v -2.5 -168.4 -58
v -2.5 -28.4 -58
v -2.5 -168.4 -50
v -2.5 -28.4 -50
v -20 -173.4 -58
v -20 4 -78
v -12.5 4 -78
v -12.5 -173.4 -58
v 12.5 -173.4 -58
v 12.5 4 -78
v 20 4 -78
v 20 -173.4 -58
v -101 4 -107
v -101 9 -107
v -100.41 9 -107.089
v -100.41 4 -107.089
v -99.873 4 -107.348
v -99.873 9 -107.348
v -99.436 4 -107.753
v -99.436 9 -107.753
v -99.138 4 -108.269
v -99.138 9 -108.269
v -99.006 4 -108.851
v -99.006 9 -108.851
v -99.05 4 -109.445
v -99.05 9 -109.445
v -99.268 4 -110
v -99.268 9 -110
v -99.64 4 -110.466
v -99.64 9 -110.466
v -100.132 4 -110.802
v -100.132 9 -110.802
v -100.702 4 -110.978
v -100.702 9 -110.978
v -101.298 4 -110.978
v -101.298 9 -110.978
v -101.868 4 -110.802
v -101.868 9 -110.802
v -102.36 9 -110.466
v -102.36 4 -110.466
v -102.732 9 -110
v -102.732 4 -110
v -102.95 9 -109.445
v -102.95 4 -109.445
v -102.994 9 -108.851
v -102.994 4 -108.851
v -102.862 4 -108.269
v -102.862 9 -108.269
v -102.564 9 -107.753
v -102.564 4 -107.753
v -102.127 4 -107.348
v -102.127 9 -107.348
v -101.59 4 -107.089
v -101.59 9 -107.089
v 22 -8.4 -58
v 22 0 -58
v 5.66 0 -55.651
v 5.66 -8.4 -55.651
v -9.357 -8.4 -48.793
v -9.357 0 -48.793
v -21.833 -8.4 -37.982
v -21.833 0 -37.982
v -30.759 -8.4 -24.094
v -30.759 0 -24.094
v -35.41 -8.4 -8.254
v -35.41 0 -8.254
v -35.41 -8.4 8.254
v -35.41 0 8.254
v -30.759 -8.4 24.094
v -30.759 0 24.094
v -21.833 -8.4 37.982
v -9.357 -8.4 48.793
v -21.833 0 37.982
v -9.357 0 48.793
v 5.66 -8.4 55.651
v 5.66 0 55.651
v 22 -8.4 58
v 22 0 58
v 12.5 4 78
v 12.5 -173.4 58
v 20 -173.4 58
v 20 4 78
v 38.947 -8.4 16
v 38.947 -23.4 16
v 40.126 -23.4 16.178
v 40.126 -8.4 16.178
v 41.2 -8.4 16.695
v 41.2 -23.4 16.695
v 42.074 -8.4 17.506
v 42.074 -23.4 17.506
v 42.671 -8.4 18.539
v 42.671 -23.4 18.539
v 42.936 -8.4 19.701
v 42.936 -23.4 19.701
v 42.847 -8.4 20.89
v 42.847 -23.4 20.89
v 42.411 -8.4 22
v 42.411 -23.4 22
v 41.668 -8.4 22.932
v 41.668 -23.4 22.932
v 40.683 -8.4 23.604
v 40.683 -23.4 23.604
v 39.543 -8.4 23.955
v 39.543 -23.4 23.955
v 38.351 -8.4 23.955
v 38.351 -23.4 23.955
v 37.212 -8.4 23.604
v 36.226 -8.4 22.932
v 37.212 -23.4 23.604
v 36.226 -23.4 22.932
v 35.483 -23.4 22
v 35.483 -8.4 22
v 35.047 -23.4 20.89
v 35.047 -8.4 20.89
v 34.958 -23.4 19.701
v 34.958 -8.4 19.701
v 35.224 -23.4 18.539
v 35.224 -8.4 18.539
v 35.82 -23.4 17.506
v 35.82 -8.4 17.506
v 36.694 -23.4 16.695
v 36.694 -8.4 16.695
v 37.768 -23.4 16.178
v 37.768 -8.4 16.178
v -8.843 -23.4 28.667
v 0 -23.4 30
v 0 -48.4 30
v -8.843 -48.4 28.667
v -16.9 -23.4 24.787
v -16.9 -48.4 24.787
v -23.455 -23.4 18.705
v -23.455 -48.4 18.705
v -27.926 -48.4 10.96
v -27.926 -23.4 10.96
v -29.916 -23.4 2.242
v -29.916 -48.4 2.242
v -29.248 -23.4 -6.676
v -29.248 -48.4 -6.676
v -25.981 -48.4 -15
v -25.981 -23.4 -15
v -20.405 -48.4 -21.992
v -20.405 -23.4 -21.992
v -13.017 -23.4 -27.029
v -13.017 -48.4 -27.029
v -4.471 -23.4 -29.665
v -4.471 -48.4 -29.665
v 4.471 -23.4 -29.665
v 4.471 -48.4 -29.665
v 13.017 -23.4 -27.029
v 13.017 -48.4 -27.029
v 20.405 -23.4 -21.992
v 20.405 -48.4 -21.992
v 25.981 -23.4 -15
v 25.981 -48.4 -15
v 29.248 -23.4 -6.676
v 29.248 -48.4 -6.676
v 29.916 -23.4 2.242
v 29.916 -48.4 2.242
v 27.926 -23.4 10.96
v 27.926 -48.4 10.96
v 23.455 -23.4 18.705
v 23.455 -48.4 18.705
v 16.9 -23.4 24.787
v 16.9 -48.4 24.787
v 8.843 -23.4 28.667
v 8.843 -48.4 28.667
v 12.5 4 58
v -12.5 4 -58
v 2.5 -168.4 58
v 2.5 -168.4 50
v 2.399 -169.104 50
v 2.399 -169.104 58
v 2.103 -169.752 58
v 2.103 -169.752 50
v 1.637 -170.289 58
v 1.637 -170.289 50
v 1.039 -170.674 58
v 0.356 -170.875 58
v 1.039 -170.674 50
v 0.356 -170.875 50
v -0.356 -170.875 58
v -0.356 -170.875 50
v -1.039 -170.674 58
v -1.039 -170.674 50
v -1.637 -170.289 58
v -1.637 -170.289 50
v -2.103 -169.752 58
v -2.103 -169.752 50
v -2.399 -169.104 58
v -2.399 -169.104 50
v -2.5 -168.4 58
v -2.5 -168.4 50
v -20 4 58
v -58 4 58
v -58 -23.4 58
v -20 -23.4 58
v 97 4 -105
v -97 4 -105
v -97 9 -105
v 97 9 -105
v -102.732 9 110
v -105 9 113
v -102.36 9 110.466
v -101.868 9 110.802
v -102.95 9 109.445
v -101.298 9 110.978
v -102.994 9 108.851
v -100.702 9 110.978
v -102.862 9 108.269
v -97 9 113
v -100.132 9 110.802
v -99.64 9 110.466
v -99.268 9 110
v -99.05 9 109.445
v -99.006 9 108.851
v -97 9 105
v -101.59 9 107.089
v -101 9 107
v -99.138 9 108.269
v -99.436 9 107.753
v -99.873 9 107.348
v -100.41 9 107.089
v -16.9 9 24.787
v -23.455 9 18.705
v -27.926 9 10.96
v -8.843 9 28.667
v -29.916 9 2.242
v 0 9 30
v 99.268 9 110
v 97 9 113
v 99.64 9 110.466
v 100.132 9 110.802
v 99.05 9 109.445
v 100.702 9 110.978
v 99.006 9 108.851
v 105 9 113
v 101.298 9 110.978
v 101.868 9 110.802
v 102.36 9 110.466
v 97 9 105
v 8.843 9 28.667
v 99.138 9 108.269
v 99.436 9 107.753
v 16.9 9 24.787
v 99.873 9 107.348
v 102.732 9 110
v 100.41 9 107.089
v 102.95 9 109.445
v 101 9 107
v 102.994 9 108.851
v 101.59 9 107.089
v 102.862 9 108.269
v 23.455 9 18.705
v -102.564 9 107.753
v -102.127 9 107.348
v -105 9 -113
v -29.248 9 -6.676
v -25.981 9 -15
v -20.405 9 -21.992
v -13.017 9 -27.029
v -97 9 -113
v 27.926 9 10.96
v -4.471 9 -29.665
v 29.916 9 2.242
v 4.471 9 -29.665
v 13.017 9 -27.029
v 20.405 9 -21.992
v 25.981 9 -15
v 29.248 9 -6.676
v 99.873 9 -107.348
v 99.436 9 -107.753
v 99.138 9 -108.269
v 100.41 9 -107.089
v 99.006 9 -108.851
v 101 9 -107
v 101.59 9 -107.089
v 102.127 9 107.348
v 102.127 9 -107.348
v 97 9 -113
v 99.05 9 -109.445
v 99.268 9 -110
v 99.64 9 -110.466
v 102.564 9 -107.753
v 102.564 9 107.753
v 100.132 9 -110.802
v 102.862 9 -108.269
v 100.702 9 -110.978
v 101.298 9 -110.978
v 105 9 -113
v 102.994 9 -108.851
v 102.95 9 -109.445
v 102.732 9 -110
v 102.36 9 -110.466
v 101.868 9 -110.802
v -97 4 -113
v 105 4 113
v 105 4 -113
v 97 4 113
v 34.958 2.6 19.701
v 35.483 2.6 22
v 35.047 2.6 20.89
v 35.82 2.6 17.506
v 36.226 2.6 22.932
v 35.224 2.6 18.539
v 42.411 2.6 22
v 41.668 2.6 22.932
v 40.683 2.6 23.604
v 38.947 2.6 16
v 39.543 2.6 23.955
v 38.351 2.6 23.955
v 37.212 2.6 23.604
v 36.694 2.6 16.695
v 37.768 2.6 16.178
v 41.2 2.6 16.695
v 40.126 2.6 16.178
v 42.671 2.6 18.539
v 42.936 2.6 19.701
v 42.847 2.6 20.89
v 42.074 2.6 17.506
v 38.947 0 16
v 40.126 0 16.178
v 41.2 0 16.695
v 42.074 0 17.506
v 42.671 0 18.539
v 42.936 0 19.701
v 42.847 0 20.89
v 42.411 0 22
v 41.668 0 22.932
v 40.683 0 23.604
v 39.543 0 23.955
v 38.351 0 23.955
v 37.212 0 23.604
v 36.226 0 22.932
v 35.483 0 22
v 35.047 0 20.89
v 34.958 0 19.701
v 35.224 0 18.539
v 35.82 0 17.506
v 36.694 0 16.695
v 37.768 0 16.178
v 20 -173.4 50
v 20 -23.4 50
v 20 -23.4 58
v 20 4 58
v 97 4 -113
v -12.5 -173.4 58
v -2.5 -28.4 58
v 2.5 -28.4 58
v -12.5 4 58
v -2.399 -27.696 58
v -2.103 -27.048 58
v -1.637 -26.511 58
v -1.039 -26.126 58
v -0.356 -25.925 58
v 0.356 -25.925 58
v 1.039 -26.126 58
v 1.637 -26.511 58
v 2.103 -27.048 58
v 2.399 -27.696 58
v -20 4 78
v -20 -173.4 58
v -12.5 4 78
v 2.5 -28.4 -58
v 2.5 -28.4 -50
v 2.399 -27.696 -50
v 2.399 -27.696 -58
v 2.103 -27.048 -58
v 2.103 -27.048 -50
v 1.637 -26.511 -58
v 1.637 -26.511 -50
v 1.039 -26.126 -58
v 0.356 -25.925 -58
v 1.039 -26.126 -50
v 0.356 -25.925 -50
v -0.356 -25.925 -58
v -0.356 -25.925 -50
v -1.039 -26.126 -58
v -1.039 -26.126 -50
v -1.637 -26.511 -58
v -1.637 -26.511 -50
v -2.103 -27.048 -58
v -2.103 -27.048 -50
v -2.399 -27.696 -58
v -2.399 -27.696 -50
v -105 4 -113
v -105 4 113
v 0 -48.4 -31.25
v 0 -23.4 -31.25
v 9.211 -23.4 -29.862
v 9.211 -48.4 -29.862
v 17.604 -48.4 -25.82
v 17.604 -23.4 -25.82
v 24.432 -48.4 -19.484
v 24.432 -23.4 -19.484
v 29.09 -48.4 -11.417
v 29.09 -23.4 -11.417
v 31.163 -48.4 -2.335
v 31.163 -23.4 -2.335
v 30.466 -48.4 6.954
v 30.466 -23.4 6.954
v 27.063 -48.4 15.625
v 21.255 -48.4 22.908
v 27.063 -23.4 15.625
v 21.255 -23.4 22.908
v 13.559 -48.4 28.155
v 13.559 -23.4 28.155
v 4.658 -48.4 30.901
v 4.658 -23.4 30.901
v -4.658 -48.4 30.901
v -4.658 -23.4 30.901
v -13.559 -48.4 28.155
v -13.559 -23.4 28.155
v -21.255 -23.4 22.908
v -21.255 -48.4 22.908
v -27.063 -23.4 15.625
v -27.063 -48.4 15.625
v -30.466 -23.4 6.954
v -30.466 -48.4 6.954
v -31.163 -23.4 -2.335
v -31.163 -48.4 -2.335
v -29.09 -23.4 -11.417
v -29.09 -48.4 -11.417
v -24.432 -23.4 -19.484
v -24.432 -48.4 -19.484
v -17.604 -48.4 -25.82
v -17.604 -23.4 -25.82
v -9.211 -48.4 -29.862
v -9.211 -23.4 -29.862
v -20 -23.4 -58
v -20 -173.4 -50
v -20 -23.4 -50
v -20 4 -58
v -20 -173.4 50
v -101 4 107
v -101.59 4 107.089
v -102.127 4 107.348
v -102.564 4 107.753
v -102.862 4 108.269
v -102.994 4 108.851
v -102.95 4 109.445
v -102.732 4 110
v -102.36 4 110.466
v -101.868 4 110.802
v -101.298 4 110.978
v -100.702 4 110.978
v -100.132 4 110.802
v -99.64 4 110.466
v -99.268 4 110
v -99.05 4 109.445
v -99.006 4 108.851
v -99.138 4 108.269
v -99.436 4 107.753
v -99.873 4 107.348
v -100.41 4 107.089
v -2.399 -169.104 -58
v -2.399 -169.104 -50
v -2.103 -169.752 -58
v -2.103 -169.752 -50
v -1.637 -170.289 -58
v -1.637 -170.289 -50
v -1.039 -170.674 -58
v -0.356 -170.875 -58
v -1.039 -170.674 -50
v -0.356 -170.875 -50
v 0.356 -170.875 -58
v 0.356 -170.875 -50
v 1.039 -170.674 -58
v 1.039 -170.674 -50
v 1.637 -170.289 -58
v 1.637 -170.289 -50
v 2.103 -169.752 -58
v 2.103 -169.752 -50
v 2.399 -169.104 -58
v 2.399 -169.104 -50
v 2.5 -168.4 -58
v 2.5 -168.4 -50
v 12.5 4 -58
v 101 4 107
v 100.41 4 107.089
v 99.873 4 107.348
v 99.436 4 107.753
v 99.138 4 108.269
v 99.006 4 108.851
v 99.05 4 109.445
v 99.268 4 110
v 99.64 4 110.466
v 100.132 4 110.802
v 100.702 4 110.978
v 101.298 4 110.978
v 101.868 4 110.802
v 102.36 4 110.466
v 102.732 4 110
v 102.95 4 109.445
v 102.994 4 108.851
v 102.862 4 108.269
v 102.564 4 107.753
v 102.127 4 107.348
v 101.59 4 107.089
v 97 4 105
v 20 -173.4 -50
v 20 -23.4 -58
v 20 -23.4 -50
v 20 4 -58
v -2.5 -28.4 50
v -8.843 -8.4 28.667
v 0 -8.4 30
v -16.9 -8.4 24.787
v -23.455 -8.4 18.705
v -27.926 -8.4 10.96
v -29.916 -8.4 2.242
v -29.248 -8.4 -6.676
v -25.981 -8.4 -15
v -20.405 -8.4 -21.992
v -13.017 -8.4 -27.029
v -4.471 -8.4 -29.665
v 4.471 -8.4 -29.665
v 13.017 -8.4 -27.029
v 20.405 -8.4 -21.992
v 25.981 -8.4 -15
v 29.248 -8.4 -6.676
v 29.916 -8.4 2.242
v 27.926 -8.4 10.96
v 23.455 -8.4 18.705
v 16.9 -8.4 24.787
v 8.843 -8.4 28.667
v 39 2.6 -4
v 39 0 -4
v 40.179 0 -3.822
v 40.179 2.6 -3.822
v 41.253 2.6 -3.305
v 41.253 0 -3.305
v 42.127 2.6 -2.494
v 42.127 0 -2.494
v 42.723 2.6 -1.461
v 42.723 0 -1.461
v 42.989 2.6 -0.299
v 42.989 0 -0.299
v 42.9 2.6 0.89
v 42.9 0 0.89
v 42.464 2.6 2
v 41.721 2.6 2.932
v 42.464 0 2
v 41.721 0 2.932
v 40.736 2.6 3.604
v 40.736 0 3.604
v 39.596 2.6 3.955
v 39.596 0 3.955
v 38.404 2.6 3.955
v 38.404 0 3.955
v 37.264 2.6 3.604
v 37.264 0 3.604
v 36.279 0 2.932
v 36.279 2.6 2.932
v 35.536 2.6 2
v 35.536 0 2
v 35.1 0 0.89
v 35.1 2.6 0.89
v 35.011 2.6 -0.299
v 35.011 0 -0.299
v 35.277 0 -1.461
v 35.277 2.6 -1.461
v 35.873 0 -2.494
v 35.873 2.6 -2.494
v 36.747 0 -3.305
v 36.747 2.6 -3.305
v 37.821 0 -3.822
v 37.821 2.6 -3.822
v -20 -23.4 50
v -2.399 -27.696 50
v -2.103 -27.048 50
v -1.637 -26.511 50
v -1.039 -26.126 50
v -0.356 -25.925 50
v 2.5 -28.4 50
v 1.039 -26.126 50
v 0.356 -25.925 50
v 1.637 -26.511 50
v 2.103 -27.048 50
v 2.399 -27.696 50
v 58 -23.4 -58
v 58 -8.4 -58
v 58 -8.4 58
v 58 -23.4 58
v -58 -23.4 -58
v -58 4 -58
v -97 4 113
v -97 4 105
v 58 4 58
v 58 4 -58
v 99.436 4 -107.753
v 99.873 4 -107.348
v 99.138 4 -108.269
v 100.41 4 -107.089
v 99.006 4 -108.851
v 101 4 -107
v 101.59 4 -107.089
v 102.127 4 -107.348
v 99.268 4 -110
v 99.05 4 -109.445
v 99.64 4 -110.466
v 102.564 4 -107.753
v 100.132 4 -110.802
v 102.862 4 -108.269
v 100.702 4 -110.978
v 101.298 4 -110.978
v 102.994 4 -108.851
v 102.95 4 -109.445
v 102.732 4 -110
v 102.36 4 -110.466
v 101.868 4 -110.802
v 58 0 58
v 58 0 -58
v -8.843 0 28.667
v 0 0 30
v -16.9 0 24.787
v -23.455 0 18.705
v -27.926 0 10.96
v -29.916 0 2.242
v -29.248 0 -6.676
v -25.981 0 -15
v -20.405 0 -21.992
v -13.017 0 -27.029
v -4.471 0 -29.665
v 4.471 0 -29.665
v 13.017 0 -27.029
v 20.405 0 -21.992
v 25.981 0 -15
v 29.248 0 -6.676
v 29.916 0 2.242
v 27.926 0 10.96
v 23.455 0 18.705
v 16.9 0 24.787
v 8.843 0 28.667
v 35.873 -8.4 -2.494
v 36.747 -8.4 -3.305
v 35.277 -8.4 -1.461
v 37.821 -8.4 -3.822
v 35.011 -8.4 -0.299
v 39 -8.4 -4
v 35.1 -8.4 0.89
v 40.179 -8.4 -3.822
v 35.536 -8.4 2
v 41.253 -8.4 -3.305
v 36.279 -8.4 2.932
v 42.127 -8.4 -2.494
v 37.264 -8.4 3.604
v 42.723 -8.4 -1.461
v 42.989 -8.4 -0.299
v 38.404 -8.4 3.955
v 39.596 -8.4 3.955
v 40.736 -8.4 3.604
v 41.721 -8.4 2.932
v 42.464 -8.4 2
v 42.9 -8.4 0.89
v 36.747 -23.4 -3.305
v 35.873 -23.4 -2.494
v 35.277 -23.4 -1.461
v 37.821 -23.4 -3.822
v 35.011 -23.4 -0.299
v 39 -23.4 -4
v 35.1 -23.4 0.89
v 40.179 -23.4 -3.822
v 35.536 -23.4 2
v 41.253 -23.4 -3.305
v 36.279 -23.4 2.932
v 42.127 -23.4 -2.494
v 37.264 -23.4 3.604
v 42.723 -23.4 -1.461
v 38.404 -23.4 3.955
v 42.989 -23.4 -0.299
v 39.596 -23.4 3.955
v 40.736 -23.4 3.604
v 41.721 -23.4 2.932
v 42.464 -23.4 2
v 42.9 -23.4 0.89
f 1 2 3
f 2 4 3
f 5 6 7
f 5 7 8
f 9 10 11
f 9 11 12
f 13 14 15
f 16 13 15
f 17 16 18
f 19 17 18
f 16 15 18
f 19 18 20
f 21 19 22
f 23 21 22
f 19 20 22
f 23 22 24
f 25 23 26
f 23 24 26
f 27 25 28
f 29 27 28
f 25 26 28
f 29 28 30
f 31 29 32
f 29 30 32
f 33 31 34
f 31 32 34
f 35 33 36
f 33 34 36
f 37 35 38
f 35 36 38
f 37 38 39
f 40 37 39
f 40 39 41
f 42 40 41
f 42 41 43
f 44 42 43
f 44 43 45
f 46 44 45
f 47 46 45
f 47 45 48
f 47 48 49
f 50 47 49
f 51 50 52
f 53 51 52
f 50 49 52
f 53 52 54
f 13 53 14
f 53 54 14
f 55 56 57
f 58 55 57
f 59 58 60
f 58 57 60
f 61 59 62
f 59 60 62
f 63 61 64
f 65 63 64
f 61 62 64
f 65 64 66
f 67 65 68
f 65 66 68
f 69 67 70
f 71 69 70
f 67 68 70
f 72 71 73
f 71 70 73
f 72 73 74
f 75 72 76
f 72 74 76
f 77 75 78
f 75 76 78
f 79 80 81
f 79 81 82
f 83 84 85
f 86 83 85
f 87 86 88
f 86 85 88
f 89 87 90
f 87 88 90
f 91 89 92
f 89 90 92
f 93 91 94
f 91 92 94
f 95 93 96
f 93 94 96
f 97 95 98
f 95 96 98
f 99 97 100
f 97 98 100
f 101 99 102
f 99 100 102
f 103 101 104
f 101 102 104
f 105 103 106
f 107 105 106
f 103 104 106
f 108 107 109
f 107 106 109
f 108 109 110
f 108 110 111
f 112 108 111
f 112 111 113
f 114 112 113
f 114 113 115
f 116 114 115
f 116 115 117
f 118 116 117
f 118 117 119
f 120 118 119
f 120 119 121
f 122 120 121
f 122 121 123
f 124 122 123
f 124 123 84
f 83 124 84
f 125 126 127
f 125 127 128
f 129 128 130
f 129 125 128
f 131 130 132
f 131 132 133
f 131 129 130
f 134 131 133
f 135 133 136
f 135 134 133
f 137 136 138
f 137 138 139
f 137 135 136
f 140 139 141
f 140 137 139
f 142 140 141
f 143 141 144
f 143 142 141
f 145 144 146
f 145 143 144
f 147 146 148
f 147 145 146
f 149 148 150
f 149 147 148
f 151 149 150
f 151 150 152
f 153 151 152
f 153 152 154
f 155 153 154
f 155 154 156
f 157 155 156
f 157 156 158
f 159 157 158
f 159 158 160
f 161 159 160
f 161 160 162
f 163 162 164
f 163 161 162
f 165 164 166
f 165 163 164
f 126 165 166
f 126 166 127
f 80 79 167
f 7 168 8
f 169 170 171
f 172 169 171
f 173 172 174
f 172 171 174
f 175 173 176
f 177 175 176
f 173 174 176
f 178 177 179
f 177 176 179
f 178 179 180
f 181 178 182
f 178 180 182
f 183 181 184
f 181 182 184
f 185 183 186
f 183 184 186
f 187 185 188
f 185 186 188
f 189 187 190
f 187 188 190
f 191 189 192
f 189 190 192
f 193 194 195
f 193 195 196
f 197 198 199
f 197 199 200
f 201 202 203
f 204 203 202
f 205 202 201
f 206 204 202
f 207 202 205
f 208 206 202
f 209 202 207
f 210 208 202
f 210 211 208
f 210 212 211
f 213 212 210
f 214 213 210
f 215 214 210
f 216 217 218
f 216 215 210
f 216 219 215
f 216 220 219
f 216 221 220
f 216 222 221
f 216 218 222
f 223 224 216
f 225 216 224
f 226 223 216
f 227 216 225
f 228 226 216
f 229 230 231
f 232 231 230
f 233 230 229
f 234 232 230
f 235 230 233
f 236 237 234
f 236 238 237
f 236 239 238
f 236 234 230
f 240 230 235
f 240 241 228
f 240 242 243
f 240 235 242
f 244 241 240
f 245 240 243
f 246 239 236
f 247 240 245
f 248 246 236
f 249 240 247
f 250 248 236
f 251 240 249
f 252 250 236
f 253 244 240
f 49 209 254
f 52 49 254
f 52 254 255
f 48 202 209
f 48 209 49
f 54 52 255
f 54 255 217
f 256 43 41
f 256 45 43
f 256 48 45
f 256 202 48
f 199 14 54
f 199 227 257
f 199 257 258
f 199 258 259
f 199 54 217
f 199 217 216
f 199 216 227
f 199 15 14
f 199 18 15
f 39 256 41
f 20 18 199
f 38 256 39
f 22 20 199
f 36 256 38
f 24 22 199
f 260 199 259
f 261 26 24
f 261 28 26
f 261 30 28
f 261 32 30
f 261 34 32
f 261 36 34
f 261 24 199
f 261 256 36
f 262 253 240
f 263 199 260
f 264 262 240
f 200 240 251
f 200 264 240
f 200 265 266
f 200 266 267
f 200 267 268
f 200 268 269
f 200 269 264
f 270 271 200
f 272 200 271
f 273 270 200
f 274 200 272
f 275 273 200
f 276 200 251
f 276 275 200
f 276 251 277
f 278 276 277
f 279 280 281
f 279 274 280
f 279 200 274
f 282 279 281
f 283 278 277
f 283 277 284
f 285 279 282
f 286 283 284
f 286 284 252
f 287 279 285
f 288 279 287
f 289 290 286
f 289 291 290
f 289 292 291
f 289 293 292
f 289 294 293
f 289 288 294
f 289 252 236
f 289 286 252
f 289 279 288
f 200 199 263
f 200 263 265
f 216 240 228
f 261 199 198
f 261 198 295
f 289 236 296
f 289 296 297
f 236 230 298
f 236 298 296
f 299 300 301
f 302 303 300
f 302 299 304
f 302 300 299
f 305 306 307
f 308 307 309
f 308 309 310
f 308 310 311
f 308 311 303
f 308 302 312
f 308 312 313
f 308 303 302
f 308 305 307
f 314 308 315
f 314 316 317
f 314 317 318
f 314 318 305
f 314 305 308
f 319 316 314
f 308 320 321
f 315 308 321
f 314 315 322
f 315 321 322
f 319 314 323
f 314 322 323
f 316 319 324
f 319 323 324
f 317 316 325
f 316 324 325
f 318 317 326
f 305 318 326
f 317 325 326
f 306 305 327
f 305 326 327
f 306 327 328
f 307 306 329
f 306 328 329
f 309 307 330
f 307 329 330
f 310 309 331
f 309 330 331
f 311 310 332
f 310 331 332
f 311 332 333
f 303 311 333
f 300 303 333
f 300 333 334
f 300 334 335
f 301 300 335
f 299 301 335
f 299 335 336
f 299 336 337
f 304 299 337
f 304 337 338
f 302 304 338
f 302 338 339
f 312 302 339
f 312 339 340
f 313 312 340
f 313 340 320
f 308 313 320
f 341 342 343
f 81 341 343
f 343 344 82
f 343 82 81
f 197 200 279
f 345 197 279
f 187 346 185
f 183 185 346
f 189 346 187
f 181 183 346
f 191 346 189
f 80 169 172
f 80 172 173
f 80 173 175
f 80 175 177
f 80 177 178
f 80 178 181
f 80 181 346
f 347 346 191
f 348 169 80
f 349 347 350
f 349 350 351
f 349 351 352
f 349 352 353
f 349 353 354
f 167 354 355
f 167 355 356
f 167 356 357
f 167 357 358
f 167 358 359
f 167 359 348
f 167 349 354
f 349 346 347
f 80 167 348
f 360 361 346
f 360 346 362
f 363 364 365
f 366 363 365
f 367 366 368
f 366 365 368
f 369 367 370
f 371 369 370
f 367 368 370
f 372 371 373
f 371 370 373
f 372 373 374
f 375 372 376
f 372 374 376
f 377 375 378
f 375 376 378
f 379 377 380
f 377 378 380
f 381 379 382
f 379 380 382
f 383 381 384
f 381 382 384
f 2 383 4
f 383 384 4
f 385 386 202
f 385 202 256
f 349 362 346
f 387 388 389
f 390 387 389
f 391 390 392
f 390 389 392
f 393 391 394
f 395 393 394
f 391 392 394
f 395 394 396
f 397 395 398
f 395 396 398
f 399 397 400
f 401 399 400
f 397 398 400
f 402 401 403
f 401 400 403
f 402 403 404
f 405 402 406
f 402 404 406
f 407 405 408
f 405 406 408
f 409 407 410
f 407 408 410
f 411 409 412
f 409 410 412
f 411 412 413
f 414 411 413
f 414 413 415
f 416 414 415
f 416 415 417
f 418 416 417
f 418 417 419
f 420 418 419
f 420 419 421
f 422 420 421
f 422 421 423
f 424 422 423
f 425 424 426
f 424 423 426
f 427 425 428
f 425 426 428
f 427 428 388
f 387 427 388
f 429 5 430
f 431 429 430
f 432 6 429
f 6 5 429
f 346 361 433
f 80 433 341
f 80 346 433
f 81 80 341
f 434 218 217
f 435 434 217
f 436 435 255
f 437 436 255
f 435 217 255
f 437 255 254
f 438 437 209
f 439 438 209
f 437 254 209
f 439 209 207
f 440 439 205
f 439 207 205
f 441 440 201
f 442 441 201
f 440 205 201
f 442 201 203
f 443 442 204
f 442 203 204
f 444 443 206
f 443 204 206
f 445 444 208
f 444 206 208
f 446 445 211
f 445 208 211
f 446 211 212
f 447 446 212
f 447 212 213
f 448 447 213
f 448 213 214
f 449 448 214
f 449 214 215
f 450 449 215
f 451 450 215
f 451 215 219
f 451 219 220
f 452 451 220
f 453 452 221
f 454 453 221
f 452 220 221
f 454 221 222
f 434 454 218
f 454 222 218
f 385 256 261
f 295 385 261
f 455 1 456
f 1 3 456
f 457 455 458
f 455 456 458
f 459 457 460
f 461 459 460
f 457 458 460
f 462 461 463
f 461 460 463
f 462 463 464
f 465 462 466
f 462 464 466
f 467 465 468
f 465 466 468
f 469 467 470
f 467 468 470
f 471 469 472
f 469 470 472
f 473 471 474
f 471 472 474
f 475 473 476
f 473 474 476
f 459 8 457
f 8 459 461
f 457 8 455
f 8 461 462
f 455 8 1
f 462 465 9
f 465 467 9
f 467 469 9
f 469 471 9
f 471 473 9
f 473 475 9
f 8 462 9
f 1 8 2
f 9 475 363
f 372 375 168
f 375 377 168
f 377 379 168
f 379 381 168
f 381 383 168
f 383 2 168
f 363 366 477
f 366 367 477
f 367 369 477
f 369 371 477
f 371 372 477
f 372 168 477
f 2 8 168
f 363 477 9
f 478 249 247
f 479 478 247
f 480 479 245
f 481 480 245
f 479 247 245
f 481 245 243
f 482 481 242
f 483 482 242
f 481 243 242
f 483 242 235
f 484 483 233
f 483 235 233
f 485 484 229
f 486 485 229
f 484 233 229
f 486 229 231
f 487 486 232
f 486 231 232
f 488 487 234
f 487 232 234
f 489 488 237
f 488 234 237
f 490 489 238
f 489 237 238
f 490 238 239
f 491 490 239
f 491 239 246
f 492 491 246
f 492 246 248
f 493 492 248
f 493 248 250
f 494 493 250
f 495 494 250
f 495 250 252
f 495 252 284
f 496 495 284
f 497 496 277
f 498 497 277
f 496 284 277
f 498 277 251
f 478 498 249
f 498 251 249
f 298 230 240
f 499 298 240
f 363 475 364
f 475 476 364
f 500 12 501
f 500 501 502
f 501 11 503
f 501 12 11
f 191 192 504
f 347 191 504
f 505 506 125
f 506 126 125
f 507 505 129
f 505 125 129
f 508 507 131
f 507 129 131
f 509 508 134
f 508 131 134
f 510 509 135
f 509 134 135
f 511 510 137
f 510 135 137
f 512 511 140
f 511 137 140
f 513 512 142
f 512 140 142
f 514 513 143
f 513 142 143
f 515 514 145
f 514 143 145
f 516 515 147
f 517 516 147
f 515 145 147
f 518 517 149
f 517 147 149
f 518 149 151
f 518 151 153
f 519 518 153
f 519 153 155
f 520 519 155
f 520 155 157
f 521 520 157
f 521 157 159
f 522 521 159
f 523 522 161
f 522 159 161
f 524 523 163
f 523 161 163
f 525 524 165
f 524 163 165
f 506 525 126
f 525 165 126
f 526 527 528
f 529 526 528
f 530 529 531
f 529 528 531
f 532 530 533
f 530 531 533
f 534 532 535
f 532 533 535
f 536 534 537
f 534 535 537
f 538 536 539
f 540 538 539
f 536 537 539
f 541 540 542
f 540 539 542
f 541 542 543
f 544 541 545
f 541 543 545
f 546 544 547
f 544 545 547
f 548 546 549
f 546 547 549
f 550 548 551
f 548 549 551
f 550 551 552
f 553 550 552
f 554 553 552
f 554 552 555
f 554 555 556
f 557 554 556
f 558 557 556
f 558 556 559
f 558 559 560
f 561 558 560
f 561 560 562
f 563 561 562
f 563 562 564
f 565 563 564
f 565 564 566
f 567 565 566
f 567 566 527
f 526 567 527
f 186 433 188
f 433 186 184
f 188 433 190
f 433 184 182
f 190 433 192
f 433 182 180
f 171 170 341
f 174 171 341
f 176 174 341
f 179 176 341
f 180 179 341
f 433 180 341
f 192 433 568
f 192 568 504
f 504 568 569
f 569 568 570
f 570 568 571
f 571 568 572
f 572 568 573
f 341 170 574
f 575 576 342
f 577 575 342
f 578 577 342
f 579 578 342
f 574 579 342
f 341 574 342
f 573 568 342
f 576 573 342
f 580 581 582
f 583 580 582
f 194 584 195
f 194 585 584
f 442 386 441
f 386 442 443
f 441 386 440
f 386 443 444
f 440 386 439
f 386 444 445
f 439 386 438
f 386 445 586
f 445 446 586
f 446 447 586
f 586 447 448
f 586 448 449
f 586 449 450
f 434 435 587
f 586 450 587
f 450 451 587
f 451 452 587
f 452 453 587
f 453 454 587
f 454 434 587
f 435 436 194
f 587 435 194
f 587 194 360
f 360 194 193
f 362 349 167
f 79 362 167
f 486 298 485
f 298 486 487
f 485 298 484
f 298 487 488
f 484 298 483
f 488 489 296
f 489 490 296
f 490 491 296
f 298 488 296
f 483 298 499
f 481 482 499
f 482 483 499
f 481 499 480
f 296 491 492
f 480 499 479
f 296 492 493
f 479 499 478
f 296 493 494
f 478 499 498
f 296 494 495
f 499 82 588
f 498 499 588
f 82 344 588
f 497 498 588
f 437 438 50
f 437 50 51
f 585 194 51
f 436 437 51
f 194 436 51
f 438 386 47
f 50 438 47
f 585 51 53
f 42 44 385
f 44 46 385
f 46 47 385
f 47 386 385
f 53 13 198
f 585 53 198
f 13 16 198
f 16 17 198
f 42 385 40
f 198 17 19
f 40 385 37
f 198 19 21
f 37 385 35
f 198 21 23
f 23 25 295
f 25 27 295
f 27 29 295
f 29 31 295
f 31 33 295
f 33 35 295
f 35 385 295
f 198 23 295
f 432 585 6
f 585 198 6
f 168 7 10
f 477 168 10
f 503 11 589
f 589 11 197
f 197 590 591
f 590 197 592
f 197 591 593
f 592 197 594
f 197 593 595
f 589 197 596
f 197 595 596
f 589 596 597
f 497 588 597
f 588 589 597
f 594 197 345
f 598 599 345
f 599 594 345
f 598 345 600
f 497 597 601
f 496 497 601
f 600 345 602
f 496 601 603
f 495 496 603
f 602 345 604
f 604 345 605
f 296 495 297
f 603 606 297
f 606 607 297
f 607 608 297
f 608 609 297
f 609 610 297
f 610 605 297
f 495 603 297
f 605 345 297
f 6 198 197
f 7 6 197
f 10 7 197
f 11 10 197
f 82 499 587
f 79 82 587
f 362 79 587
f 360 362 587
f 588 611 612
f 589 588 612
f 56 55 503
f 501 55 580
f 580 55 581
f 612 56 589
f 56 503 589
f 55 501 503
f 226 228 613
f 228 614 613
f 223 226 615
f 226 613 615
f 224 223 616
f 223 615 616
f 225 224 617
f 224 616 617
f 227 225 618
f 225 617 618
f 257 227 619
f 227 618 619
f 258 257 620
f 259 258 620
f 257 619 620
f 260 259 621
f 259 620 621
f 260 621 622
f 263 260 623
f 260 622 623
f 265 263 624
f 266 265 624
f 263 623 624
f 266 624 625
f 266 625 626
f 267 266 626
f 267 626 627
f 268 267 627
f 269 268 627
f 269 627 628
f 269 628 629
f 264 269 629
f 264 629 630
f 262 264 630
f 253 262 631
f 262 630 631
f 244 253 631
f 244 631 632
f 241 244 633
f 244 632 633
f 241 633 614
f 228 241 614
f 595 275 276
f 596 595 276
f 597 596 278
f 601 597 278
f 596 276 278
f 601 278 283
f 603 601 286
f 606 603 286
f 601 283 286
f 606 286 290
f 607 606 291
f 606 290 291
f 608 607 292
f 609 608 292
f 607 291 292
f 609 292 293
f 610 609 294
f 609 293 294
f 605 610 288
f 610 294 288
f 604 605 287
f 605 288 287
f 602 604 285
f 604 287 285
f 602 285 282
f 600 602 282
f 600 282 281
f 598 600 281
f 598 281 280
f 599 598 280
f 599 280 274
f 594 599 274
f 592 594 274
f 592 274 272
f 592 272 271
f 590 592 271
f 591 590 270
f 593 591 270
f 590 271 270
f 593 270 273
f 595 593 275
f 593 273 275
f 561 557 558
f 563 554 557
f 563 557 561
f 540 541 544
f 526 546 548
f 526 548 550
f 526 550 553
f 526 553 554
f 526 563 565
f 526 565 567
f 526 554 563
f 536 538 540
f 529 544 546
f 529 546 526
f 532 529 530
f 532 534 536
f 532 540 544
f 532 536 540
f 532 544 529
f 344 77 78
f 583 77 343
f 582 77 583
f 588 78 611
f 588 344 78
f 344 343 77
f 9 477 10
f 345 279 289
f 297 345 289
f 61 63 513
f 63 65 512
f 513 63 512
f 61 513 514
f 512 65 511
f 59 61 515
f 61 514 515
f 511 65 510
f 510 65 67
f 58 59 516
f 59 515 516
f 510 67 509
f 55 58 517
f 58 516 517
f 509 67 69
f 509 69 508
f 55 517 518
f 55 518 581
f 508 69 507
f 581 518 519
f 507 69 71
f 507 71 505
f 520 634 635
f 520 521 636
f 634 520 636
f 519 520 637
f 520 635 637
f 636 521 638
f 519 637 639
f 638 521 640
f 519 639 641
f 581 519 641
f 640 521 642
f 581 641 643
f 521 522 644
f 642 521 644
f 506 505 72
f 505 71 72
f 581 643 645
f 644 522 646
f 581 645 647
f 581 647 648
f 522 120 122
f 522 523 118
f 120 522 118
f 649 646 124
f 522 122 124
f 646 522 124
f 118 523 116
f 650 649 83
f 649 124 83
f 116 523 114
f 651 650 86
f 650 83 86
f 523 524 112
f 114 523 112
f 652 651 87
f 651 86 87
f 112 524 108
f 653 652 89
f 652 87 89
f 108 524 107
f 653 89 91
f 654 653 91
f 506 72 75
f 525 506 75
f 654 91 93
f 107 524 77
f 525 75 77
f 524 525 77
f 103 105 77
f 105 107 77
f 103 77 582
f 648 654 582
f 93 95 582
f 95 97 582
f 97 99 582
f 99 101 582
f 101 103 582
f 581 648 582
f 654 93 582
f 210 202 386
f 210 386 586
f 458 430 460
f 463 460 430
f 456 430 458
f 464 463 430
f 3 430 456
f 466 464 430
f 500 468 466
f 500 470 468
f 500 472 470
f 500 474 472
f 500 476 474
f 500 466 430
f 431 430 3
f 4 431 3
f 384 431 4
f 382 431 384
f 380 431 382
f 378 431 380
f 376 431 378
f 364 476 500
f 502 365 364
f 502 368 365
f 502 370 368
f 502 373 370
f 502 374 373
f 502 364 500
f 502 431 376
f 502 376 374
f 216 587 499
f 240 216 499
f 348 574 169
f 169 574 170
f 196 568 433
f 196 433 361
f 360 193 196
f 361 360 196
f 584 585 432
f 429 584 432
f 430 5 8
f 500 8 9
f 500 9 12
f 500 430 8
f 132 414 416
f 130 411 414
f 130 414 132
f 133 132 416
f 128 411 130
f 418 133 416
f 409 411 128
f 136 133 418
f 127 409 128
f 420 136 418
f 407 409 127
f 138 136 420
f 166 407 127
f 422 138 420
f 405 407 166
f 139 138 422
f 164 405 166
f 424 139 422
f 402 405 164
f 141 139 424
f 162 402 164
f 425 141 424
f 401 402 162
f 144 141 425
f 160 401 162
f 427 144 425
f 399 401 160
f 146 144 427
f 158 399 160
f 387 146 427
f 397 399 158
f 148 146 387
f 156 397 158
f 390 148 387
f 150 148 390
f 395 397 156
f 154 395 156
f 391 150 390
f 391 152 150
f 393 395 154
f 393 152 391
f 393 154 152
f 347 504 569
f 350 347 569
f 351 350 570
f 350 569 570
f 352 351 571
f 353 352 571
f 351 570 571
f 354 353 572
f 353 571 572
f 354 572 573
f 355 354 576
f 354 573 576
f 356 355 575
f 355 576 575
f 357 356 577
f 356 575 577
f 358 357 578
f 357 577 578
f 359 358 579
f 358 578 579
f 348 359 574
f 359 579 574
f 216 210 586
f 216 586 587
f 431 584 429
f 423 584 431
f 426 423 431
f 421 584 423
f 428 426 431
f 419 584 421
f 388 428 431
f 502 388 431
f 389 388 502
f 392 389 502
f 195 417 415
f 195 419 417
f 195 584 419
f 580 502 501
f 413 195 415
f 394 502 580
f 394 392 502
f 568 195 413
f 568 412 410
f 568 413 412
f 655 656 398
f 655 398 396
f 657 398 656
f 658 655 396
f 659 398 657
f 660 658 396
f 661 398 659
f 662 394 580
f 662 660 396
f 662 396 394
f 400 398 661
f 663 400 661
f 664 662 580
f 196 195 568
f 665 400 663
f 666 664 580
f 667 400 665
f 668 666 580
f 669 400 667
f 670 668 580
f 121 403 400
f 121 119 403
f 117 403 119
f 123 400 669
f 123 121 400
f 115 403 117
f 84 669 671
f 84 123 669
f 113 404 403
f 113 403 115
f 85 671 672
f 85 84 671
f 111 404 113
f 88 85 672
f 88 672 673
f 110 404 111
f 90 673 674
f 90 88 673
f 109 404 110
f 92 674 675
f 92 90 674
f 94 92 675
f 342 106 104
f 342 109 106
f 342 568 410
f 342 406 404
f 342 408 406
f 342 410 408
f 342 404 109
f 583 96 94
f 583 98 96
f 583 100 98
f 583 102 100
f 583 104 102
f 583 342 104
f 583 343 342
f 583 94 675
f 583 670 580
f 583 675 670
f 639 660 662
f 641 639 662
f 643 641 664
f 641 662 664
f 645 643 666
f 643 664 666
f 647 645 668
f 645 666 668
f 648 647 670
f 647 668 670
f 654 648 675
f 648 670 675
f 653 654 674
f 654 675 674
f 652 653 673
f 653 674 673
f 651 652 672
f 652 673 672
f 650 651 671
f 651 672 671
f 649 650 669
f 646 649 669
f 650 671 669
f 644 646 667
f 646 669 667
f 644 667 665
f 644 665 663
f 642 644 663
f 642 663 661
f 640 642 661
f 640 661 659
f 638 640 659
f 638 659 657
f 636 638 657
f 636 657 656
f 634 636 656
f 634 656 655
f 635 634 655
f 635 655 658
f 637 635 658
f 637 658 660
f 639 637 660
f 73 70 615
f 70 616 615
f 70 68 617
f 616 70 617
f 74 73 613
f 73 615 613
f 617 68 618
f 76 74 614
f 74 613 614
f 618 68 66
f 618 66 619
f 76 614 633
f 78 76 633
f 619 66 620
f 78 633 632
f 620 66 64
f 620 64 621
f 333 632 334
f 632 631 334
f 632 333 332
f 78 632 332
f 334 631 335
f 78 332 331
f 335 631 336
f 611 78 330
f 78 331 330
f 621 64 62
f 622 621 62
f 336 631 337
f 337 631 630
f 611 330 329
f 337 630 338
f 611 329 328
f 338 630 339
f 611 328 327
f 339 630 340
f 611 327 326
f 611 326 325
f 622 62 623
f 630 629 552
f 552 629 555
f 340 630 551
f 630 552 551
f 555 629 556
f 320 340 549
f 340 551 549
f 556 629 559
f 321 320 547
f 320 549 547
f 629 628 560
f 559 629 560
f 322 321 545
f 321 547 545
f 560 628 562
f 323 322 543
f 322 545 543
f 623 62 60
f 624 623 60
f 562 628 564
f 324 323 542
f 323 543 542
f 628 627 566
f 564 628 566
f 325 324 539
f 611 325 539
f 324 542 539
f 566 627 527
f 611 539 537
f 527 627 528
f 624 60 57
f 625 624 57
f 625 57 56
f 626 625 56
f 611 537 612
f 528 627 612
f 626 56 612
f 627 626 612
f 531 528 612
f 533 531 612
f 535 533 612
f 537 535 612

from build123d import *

# Parameters (mm, degrees)
SKETCH4_W                      = 116
SKETCH4_H                      = 116
BOSS_EXTRUDE1_DEPTH            = 4
SKETCH6_R                      = 30
CUT_EXTRUDE1_DEPTH             = 83.121860671
BOSS_EXTRUDE3_DEPTH            = 8.4
SKETCH10_W                     = 116
SKETCH10_H                     = 116
BOSS_EXTRUDE5_DEPTH            = 15
SKETCH11_R                     = 4
POSITIONING_HOLE_DEPTH         = 26
SKETCH23_R                     = 4
SNAPPING_HOLE_DEPTH            = 26
SKETCH13_R                     = 31.25
SKETCH13_R_2                   = 30
BOSS_EXTRUDE6_DEPTH            = 25
SKETCH24_W                     = 40
SKETCH24_H                     = 8
BOSS_EXTRUDE7_DEPTH            = 150
BOSS_EXTRUDE9_DEPTH            = 40
CUT_EXTRUDE6_DEPTH             = 8
CUT_EXTRUDE6_DIRECTION_2_REACH = 229.876
CUT_EXTRUDE7_REACH             = 225.194
CUT_EXTRUDE9_REACH             = 204.284
SKETCH37_W                     = 25
SKETCH37_H                     = 20
SKETCH41_W                     = 210
SKETCH41_H                     = 210
BOSS_EXTRUDE11_DEPTH           = 5
SKETCH12_R                     = 30
MAIN_HOLE_DEPTH                = 212.068709192
SKETCH43_W                     = 8
SKETCH43_H                     = 8
SKETCH43_R                     = 2
BOSS_EXTRUDE12_DEPTH           = 5


with BuildPart() as part:
    # Sketch4 → Boss-Extrude1 (new body)
    with BuildSketch(Plane(origin=(0, 0, 0), x_dir=(1, 0, 0), z_dir=(0, 1, 0))):
        Rectangle(SKETCH4_W, SKETCH4_H)
    extrude(amount=BOSS_EXTRUDE1_DEPTH)

    # Sketch6 → Cut-Extrude1 (cut, through all)
    with BuildSketch(Plane(origin=(0, 4, 0), x_dir=(1, 0, 0), z_dir=(0, 1, 0))):
        with Locations(Location((0, 0, 0), (0, 0, 270))):
            Circle(SKETCH6_R)
    extrude(amount=-CUT_EXTRUDE1_DEPTH, mode=Mode.SUBTRACT)

    # Sketch8 → Boss-Extrude3 (add)
    with BuildSketch(Plane.XZ):
        with BuildLine():
            Line((-58, 58), (-58, -58))
            Line((-58, -58), (22, -58))
            ThreePointArc((22, -58), (-36, 0), (22, 58))
            Line((22, 58), (-58, 58))
        make_face()
    extrude(amount=BOSS_EXTRUDE3_DEPTH)

    # Sketch10 → Boss-Extrude5 (add)
    with BuildSketch(Plane.XZ.offset(8.4)):
        Rectangle(SKETCH10_W, SKETCH10_H)
    extrude(amount=BOSS_EXTRUDE5_DEPTH)

    # Sketch11 → positioning hole (cut)
    with BuildSketch(Plane.XZ.offset(23.4)):
        with Locations(Location((39, 0, 0), (0, 0, 270))):
            Circle(SKETCH11_R)
    extrude(amount=-POSITIONING_HOLE_DEPTH, mode=Mode.SUBTRACT)

    # Sketch23 → snapping hole (cut)
    with BuildSketch(Plane.XZ.offset(23.4)):
        with Locations(Location((38.947036647, 20, 0), (0, 0, 270))):
            Circle(SKETCH23_R)
    extrude(amount=-SNAPPING_HOLE_DEPTH, mode=Mode.SUBTRACT)

    # Sketch13 → Boss-Extrude6 (add)
    with BuildSketch(Plane.XZ.offset(23.4)):
        with Locations(Location((0, 0, 0), (0, 0, 270))):
            Circle(SKETCH13_R)
        with Locations(Location((0, 0, 0), (0, 0, 90))):
            Circle(SKETCH13_R_2, mode=Mode.SUBTRACT)
    extrude(amount=BOSS_EXTRUDE6_DEPTH)

    # Sketch24 → Boss-Extrude7 (add)
    with BuildSketch(Plane.XZ.offset(23.4)):
        with Locations((0, 54)):
            Rectangle(SKETCH24_W, SKETCH24_H)
        with Locations((0, -54)):
            Rectangle(SKETCH24_W, SKETCH24_H)
    extrude(amount=BOSS_EXTRUDE7_DEPTH)

    # Sketch28 → Boss-Extrude9 (add)
    with BuildSketch(Plane.ZY.offset(20)):
        Polygon((-58, -173.4), (-58, 4), (-78, 4), align=None)
        Polygon((58, 4), (58, -173.4), (78, 4), align=None)
    extrude(amount=-BOSS_EXTRUDE9_DEPTH)

    # Sketch31 → Cut-Extrude6 (cut)
    with BuildSketch(Plane(origin=(0, 0, -58), x_dir=(-1, 0, 0), z_dir=(0, 0, -1))):
        with BuildLine():
            Line((2.5, -28.4), (2.5, -168.4))
            ThreePointArc((2.5, -168.4), (0, -170.9), (-2.5, -168.4))
            Line((-2.5, -168.4), (-2.5, -28.4))
            ThreePointArc((-2.5, -28.4), (0, -25.9), (2.5, -28.4))
        make_face()
    extrude(amount=-CUT_EXTRUDE6_DEPTH, mode=Mode.SUBTRACT)

    # Cut-Extrude6 direction 2: up to this plane
    cut_extrude6_direction_2_end = Plane(origin=(20, 4, -78), z_dir=(0, -0.11202985805393491, -0.9937048409384023))
    # Sketch31 → Cut-Extrude6 direction 2 (cut, up to the surface)
    with BuildSketch(Plane(origin=(0, 0, -58), x_dir=(-1, 0, 0), z_dir=(0, 0, -1)), mode=Mode.PRIVATE) as cut_extrude6_direction_2_sk1:
        with BuildLine():
            Line((2.5, -28.4), (2.5, -168.4))
            ThreePointArc((2.5, -168.4), (0, -170.9), (-2.5, -168.4))
            Line((-2.5, -168.4), (-2.5, -28.4))
            ThreePointArc((-2.5, -28.4), (0, -25.9), (2.5, -28.4))
        make_face()
    cut_extrude6_direction_2_tool1 = split(extrude(cut_extrude6_direction_2_sk1.sketch, amount=CUT_EXTRUDE6_DIRECTION_2_REACH, mode=Mode.PRIVATE), bisect_by=cut_extrude6_direction_2_end, keep=Keep.BOTH, mode=Mode.PRIVATE)
    add(cut_extrude6_direction_2_tool1.solids().sort_by_distance((0, -98.4, -58))[0], mode=Mode.SUBTRACT)

    # Cut-Extrude7: up to this plane
    cut_extrude7_end = Plane(origin=(20, -173.4, 58), z_dir=(0, -0.11202985805393491, 0.9937048409384023))
    # Sketch34 → Cut-Extrude7 (cut, up to the surface)
    with BuildSketch(Plane(origin=(0, 0, 50), x_dir=(-1, 0, 0), z_dir=(0, 0, -1)), mode=Mode.PRIVATE) as cut_extrude7_sk1:
        with BuildLine():
            Line((-2.5, -28.4), (-2.5, -168.4))
            ThreePointArc((-2.5, -168.4), (0, -170.9), (2.5, -168.4))
            Line((2.5, -168.4), (2.5, -28.4))
            ThreePointArc((2.5, -28.4), (0, -25.9), (-2.5, -28.4))
        make_face()
    cut_extrude7_tool1 = split(extrude(cut_extrude7_sk1.sketch, amount=-CUT_EXTRUDE7_REACH, mode=Mode.PRIVATE), bisect_by=cut_extrude7_end, keep=Keep.BOTH, mode=Mode.PRIVATE)
    add(cut_extrude7_tool1.solids().sort_by_distance((0, -98.4, 50))[0], mode=Mode.SUBTRACT)

    # Sketch37 → Cut-Extrude9 (cut, up to next)
    with BuildSketch(Plane(origin=(0, 4, 0), x_dir=(1, 0, 0), z_dir=(0, 1, 0)), mode=Mode.PRIVATE) as cut_extrude9_sk1:
        with Locations((0, 68)):
            Rectangle(SKETCH37_W, SKETCH37_H)
    cut_extrude9_tool1 = extrude(cut_extrude9_sk1.sketch, amount=-CUT_EXTRUDE9_REACH, mode=Mode.PRIVATE) & part.part
    # Sketch37 → Cut-Extrude9 (cut, up to next)
    with BuildSketch(Plane(origin=(0, 4, 0), x_dir=(1, 0, 0), z_dir=(0, 1, 0)), mode=Mode.PRIVATE) as cut_extrude9_sk2:
        with Locations((0, -68)):
            Rectangle(SKETCH37_W, SKETCH37_H)
    cut_extrude9_tool2 = extrude(cut_extrude9_sk2.sketch, amount=-CUT_EXTRUDE9_REACH, mode=Mode.PRIVATE) & part.part
    add(cut_extrude9_tool1.solids().sort_by_distance((0, 4, -68))[0], mode=Mode.SUBTRACT)
    add(cut_extrude9_tool2.solids().sort_by_distance((0, 4, 68))[0], mode=Mode.SUBTRACT)

    # Sketch41 → Boss-Extrude11 (add)
    with BuildSketch(Plane(origin=(0, 4, 0), x_dir=(1, 0, 0), z_dir=(0, 1, 0))):
        Rectangle(SKETCH41_W, SKETCH41_H)
    extrude(amount=BOSS_EXTRUDE11_DEPTH)

    # Sketch12 → main hole (cut, through all)
    with BuildSketch(Plane.XZ.offset(23.4)):
        with Locations(Location((0, 0, 0), (0, 0, 90))):
            Circle(SKETCH12_R)
    extrude(amount=-MAIN_HOLE_DEPTH, mode=Mode.SUBTRACT)

    # Sketch43 → Boss-Extrude12 (add)
    # profile 1 of 4: a face of its own
    with BuildSketch(Plane(origin=(0, 9, 0), x_dir=(1, 0, 0), z_dir=(0, 1, 0))):
        with Locations((101, 109)):
            Rectangle(SKETCH43_W, SKETCH43_H)
        with Locations(Location((101, 109, 0), (0, 0, 270))):
            Circle(SKETCH43_R, mode=Mode.SUBTRACT)
    # profile 2 of 4: a face of its own
    with BuildSketch(Plane(origin=(0, 9, 0), x_dir=(1, 0, 0), z_dir=(0, 1, 0))):
        with Locations((-101, 109)):
            Rectangle(SKETCH43_W, SKETCH43_H)
        with Locations(Location((-101, 109, 0), (0, 0, 270))):
            Circle(SKETCH43_R, mode=Mode.SUBTRACT)
    # profile 3 of 4: a face of its own
    with BuildSketch(Plane(origin=(0, 9, 0), x_dir=(1, 0, 0), z_dir=(0, 1, 0))):
        with Locations((-101, -109)):
            Rectangle(SKETCH43_W, SKETCH43_H)
        with Locations(Location((-101, -109, 0), (0, 0, 90))):
            Circle(SKETCH43_R, mode=Mode.SUBTRACT)
    # profile 4 of 4: a face of its own
    with BuildSketch(Plane(origin=(0, 9, 0), x_dir=(1, 0, 0), z_dir=(0, 1, 0))):
        with Locations((101, -109)):
            Rectangle(SKETCH43_W, SKETCH43_H)
        with Locations(Location((101, -109, 0), (0, 0, 90))):
            Circle(SKETCH43_R, mode=Mode.SUBTRACT)
    extrude(amount=-BOSS_EXTRUDE12_DEPTH)


solid = part.part
